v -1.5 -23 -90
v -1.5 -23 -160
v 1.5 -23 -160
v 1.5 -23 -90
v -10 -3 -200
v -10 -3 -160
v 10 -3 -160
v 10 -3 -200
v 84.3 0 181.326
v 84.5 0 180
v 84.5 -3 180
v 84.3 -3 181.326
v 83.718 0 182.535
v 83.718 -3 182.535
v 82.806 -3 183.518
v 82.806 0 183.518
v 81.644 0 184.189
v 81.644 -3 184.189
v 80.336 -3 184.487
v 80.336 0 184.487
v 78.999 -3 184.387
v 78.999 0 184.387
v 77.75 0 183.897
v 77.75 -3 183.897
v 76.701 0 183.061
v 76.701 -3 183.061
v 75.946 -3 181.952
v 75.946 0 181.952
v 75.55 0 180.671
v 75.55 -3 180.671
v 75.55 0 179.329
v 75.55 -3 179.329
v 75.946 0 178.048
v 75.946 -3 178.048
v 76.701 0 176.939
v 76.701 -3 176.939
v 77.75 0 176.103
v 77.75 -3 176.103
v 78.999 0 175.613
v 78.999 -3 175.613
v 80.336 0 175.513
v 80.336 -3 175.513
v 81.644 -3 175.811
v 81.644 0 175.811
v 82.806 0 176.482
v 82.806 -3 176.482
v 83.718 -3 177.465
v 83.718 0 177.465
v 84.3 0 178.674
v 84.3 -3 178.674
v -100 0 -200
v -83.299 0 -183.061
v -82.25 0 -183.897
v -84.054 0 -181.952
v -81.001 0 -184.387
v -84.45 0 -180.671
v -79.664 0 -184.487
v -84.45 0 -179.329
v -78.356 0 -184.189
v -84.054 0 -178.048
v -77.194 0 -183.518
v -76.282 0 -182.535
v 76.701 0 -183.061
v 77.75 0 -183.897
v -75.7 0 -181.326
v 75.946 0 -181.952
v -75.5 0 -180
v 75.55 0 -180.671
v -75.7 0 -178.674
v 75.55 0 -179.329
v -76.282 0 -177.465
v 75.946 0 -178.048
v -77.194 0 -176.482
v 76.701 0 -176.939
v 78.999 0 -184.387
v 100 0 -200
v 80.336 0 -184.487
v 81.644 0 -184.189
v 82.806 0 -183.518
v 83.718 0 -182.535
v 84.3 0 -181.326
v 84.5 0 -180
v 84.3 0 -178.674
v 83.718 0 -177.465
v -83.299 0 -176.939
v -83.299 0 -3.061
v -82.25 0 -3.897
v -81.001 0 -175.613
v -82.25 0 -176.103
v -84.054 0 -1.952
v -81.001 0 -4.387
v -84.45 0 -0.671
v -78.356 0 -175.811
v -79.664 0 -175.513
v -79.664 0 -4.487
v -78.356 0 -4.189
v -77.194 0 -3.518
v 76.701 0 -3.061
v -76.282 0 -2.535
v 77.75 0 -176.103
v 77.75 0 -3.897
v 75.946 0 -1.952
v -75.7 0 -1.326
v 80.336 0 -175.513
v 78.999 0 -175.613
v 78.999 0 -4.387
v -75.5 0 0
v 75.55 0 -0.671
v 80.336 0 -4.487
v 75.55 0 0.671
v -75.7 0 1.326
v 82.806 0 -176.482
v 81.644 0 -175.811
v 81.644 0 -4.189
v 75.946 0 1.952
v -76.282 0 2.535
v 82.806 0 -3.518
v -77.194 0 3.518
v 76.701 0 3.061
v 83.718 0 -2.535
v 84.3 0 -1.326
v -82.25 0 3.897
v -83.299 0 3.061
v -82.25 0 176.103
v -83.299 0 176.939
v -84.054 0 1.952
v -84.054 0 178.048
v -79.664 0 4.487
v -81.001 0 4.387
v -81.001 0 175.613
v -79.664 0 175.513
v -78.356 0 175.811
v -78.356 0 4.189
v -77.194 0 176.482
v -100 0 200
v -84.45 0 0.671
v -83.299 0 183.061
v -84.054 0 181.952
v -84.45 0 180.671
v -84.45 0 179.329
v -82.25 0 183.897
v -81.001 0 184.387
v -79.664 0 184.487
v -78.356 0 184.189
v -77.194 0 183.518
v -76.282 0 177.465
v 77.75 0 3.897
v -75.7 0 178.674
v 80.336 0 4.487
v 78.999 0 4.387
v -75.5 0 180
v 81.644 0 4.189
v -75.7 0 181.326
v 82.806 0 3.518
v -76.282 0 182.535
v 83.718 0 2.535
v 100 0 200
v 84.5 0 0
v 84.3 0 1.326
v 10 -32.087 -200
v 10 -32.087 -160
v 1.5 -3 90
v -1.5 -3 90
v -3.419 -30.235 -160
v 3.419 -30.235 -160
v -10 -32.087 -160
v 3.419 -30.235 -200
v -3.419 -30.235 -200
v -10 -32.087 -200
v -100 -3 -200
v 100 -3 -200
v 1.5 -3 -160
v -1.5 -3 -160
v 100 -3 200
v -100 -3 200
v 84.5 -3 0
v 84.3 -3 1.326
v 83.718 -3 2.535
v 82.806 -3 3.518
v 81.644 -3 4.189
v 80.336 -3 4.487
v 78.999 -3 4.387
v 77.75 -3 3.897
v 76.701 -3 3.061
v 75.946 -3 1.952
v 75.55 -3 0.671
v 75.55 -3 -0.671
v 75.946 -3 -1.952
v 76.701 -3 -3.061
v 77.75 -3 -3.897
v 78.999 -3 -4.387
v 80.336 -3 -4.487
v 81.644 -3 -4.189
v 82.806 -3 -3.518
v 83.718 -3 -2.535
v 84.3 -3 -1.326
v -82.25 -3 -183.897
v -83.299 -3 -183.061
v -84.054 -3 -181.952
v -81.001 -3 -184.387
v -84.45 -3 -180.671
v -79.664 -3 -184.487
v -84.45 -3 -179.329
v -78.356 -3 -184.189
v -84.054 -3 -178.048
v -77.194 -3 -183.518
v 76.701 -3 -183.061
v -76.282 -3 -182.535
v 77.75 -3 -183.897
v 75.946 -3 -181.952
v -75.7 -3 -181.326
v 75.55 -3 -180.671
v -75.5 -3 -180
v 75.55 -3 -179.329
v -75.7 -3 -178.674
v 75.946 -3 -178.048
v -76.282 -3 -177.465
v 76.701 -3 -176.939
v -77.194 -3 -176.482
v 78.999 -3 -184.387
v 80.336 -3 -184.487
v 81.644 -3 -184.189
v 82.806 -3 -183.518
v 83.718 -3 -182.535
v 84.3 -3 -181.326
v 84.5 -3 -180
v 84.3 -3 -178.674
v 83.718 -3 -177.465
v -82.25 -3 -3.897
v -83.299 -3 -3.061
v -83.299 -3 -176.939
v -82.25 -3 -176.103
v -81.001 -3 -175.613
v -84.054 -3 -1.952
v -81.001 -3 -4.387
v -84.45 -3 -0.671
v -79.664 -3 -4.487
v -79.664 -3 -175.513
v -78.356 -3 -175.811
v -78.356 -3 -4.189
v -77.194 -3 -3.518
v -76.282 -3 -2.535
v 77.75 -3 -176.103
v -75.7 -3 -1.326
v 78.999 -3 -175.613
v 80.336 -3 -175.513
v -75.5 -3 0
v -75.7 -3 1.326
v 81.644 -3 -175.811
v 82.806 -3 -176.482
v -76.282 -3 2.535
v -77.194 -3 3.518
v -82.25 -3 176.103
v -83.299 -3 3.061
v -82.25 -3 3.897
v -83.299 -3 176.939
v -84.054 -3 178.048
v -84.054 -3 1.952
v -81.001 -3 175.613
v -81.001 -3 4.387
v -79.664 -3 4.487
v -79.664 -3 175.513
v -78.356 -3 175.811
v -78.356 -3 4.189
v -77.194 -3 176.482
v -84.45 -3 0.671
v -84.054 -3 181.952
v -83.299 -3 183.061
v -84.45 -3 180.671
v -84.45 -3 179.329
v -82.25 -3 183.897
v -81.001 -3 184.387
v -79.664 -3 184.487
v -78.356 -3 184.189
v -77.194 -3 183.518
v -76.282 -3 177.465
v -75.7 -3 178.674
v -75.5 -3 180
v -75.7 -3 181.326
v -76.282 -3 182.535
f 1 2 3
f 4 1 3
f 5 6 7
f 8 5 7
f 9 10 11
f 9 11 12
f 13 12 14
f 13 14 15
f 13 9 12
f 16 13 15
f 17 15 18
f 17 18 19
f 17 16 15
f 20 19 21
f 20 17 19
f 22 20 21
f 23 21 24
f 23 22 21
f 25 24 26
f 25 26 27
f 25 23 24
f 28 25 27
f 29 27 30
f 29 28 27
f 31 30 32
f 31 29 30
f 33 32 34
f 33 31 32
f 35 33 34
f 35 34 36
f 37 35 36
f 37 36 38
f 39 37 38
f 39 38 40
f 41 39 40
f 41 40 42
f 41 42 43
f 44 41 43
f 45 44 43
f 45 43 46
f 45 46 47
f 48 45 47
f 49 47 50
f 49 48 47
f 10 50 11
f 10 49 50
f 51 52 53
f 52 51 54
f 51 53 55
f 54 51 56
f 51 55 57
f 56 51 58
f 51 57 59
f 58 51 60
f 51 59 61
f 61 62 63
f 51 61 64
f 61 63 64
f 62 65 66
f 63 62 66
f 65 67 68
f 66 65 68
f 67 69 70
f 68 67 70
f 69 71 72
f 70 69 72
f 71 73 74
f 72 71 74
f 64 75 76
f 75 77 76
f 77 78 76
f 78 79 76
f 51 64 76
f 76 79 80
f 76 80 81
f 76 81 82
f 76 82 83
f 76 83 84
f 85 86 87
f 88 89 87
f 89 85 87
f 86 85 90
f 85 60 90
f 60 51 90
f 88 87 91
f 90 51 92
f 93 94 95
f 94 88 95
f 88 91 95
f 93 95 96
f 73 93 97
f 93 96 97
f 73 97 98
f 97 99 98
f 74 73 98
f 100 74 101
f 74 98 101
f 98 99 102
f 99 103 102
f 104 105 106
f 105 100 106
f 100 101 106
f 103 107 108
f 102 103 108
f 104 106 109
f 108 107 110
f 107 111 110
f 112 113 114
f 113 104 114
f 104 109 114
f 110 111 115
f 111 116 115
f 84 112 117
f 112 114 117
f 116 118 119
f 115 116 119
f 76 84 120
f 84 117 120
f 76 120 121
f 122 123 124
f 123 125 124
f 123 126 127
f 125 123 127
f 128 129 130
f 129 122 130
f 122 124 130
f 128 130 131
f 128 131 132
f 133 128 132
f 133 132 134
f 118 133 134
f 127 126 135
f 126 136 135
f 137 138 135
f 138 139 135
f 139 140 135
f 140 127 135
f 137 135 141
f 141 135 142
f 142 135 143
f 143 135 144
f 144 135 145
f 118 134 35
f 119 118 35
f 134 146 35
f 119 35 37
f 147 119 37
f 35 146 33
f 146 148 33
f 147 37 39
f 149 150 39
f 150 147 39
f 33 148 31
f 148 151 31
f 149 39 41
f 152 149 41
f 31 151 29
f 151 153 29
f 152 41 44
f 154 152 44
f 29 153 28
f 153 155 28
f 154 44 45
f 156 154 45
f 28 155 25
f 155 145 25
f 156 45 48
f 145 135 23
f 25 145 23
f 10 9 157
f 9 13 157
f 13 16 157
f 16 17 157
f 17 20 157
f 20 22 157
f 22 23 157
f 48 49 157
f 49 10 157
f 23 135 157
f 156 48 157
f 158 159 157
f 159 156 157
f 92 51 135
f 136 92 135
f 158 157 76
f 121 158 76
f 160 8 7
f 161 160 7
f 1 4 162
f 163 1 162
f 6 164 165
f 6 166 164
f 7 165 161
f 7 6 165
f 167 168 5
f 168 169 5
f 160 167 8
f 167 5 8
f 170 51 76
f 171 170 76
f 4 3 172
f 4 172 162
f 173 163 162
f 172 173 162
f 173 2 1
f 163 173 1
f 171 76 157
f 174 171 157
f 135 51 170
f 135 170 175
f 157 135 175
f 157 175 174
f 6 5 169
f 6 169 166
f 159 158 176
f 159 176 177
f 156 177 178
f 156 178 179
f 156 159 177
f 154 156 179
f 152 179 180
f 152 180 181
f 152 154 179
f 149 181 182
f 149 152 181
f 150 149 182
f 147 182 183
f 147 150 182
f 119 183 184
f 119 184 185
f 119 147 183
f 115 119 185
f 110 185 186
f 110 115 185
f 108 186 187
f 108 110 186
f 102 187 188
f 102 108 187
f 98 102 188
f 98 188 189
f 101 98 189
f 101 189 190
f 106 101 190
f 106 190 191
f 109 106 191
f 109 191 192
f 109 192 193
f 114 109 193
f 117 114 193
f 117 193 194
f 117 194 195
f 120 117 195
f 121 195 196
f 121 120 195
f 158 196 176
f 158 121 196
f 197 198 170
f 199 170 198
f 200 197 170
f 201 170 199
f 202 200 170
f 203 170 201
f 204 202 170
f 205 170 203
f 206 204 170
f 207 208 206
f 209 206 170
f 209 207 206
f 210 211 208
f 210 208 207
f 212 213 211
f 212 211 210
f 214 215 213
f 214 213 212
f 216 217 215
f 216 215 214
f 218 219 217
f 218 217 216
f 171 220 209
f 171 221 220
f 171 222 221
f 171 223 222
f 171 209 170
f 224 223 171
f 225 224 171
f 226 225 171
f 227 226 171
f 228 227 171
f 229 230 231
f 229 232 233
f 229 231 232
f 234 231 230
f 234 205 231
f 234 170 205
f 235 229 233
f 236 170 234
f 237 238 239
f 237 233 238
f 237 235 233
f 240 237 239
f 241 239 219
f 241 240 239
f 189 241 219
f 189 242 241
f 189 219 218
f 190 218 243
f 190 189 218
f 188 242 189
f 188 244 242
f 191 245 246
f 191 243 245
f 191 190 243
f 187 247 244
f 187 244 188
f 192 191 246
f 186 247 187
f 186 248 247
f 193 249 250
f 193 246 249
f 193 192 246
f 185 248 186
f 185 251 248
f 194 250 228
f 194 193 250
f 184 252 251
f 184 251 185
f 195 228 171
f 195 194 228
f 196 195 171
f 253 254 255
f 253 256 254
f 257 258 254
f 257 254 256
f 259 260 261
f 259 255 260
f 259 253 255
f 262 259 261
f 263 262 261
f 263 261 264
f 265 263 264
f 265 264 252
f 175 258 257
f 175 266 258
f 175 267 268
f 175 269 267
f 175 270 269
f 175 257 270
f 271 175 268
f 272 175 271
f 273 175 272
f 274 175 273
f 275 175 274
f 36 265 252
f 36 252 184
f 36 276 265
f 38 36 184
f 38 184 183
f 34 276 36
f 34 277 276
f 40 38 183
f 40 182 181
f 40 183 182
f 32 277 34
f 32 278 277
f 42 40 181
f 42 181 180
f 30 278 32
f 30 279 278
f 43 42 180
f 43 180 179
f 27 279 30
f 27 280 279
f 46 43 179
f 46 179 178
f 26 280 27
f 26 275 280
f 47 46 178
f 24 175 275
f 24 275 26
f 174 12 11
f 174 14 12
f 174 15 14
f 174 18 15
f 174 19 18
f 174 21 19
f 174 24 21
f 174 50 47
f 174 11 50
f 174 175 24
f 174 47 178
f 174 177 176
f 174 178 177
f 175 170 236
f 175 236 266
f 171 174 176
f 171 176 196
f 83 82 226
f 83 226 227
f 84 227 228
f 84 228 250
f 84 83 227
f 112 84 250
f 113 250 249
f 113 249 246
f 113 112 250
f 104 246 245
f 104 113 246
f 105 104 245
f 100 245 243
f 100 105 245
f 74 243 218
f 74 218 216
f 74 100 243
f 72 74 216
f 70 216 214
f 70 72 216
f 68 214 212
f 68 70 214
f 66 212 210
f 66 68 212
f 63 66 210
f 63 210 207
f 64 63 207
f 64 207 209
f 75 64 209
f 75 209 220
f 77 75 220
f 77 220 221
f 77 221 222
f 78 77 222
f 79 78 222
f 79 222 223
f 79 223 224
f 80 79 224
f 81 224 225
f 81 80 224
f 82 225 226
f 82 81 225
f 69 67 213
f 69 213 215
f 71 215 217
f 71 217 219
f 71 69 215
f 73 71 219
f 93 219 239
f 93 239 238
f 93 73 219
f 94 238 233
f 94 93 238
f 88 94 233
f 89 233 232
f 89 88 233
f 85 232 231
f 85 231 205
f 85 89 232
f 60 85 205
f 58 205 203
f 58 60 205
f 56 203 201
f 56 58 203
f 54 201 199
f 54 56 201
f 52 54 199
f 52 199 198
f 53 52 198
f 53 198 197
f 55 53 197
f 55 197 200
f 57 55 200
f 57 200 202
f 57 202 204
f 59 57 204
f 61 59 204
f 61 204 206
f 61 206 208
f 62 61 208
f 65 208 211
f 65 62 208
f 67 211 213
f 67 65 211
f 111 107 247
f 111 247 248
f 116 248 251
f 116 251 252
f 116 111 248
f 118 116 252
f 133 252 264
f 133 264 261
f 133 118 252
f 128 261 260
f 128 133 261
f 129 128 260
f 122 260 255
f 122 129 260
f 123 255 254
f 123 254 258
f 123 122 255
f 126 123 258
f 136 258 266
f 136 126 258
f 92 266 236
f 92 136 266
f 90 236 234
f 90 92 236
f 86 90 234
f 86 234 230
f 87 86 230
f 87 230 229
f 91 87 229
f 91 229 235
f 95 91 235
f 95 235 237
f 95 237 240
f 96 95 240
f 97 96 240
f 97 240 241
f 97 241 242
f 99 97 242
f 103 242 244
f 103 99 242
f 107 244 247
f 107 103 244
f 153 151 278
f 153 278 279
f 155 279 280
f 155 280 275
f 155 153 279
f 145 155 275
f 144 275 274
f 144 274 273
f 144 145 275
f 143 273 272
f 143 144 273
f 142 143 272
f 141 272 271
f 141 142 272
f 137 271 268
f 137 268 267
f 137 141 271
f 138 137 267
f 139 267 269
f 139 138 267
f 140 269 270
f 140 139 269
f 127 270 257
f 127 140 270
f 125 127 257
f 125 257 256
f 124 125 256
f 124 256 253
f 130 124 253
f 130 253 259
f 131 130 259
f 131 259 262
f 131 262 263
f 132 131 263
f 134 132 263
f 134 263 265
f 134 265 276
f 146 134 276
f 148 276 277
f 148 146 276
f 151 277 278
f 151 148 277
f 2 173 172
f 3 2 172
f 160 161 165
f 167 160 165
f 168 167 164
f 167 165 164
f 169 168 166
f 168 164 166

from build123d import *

# Parameters (mm, degrees)
F0_W     = 200
F0_H     = 400
F0_R     = 4.5
F1_DEPTH = 3
F2_W     = 20
F2_H     = 40
F3_DEPTH = 30
F5_DEPTH = 42.5
F4_W     = 3
F4_H     = 20
F6_DEPTH = 250
F8_DEPTH = 25


with BuildPart() as f1:
    # F0 (on Front) → F1 (new body)
    with BuildSketch(Plane.XZ):
        Rectangle(F0_W, F0_H)
        with Locations((-80, -180)):
            Circle(F0_R, mode=Mode.SUBTRACT)
        with Locations((80, -180)):
            Circle(F0_R, mode=Mode.SUBTRACT)
        with Locations((-80, 0)):
            Circle(F0_R, mode=Mode.SUBTRACT)
        with Locations((-80, 180)):
            Circle(F0_R, mode=Mode.SUBTRACT)
        with Locations((80, 0)):
            Circle(F0_R, mode=Mode.SUBTRACT)
        with Locations((80, 180)):
            Circle(F0_R, mode=Mode.SUBTRACT)
    extrude(amount=F1_DEPTH)


with BuildPart() as f3:
    # F2 (on face) → F3 (new body)
    with BuildSketch(Plane.XZ.offset(3)):
        with Locations((0, -180)):
            Rectangle(F2_W, F2_H)
    extrude(amount=F3_DEPTH)

    # F4 (on face) → F5 (cut)
    with BuildSketch(Plane.XY.offset(-160)):
        with BuildLine():
            Line((10, -33), (10, -32.087122))
            ThreePointArc((10, -32.087122), (0, -30), (-10, -32.087122))
            Line((-10, -32.087122), (-10, -33))
            Line((-10, -33), (10, -33))
        make_face()
    extrude(amount=-F5_DEPTH, mode=Mode.SUBTRACT)


with BuildPart() as f6:
    # F4 (on face) → F6 (new body)
    with BuildSketch(Plane.XY.offset(-160)):
        with Locations((0, -13)):
            Rectangle(F4_W, F4_H)
    extrude(amount=F6_DEPTH)

    # F7 (on face) → F8 (cut)
    with BuildSketch(Plane.YZ.offset(1.5)):
        Polygon((-23, -90), (-3, 90), (-23, 90), align=None)
    extrude(amount=-F8_DEPTH, mode=Mode.SUBTRACT)


solid = Compound([f1.part, f3.part, f6.part])
